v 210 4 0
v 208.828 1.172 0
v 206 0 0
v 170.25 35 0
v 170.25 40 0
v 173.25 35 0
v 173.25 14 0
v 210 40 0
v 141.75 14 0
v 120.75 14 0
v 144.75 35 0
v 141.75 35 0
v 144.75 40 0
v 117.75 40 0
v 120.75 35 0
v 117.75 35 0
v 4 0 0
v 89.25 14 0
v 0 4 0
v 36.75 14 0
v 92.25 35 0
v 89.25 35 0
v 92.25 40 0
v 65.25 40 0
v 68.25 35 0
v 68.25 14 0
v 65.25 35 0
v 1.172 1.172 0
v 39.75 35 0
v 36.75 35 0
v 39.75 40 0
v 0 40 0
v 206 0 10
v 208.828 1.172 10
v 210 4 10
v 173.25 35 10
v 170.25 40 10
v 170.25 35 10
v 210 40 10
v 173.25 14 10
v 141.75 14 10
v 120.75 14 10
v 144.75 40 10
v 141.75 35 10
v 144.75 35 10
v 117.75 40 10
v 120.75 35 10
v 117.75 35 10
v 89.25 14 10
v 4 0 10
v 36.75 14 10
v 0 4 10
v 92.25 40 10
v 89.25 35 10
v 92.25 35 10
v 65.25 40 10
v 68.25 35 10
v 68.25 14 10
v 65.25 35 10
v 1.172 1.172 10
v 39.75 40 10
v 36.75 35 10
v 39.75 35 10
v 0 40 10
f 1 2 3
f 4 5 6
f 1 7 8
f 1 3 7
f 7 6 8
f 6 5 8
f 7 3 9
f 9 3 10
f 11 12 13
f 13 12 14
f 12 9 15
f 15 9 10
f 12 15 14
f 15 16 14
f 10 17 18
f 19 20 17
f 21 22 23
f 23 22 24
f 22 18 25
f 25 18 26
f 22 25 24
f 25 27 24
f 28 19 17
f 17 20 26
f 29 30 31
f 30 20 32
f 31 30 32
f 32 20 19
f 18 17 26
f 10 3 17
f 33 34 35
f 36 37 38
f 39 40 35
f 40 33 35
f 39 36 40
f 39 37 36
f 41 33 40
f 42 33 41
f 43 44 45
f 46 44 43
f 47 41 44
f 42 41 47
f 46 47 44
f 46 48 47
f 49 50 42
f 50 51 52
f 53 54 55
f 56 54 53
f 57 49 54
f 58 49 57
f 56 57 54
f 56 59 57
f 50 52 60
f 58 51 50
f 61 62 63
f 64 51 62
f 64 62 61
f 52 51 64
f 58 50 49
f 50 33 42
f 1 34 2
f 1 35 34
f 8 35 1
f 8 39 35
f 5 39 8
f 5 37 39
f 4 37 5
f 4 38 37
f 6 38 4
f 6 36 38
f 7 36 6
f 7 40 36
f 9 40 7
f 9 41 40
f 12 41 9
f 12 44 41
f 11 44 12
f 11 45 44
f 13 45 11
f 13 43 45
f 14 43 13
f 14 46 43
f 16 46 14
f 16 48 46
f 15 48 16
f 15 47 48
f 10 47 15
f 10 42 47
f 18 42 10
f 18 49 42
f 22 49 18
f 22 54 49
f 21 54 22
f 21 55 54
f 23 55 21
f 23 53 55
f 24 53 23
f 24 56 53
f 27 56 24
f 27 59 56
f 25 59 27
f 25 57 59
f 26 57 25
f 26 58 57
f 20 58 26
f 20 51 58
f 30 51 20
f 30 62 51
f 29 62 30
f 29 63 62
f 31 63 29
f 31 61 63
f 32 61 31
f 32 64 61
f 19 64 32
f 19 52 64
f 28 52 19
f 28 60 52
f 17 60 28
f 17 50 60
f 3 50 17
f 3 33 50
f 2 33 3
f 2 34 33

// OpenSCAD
$fn = 32;

// ----------------------------------------------------------------------
// Oversize slot bar: 210 mm bar with 3 oversize windows
// ----------------------------------------------------------------------

// --- parameters (mm) ---
profile_height = 10;      // extrusion height
profile_points = 32;      // points of the closed outline

profile = [[0, 4], [1.172, 1.172], [4, 0], [206, 0], [208.828, 1.172], [210, 4], [210, 40], [170.25, 40], [170.25, 35], [173.25, 35], [173.25, 14], [141.75, 14], [141.75, 35], [144.75, 35], [144.75, 40], [117.75, 40], [117.75, 35], [120.75, 35], [120.75, 14], [89.25, 14], [89.25, 35], [92.25, 35], [92.25, 40], [65.25, 40], [65.25, 35], [68.25, 35], [68.25, 14], [36.75, 14], [36.75, 35], [39.75, 35], [39.75, 40], [0, 40]];  // single closed polygon, 32 points, counter clockwise

// --- the one profile operation ---
linear_extrude(height = profile_height) polygon(points = profile);
